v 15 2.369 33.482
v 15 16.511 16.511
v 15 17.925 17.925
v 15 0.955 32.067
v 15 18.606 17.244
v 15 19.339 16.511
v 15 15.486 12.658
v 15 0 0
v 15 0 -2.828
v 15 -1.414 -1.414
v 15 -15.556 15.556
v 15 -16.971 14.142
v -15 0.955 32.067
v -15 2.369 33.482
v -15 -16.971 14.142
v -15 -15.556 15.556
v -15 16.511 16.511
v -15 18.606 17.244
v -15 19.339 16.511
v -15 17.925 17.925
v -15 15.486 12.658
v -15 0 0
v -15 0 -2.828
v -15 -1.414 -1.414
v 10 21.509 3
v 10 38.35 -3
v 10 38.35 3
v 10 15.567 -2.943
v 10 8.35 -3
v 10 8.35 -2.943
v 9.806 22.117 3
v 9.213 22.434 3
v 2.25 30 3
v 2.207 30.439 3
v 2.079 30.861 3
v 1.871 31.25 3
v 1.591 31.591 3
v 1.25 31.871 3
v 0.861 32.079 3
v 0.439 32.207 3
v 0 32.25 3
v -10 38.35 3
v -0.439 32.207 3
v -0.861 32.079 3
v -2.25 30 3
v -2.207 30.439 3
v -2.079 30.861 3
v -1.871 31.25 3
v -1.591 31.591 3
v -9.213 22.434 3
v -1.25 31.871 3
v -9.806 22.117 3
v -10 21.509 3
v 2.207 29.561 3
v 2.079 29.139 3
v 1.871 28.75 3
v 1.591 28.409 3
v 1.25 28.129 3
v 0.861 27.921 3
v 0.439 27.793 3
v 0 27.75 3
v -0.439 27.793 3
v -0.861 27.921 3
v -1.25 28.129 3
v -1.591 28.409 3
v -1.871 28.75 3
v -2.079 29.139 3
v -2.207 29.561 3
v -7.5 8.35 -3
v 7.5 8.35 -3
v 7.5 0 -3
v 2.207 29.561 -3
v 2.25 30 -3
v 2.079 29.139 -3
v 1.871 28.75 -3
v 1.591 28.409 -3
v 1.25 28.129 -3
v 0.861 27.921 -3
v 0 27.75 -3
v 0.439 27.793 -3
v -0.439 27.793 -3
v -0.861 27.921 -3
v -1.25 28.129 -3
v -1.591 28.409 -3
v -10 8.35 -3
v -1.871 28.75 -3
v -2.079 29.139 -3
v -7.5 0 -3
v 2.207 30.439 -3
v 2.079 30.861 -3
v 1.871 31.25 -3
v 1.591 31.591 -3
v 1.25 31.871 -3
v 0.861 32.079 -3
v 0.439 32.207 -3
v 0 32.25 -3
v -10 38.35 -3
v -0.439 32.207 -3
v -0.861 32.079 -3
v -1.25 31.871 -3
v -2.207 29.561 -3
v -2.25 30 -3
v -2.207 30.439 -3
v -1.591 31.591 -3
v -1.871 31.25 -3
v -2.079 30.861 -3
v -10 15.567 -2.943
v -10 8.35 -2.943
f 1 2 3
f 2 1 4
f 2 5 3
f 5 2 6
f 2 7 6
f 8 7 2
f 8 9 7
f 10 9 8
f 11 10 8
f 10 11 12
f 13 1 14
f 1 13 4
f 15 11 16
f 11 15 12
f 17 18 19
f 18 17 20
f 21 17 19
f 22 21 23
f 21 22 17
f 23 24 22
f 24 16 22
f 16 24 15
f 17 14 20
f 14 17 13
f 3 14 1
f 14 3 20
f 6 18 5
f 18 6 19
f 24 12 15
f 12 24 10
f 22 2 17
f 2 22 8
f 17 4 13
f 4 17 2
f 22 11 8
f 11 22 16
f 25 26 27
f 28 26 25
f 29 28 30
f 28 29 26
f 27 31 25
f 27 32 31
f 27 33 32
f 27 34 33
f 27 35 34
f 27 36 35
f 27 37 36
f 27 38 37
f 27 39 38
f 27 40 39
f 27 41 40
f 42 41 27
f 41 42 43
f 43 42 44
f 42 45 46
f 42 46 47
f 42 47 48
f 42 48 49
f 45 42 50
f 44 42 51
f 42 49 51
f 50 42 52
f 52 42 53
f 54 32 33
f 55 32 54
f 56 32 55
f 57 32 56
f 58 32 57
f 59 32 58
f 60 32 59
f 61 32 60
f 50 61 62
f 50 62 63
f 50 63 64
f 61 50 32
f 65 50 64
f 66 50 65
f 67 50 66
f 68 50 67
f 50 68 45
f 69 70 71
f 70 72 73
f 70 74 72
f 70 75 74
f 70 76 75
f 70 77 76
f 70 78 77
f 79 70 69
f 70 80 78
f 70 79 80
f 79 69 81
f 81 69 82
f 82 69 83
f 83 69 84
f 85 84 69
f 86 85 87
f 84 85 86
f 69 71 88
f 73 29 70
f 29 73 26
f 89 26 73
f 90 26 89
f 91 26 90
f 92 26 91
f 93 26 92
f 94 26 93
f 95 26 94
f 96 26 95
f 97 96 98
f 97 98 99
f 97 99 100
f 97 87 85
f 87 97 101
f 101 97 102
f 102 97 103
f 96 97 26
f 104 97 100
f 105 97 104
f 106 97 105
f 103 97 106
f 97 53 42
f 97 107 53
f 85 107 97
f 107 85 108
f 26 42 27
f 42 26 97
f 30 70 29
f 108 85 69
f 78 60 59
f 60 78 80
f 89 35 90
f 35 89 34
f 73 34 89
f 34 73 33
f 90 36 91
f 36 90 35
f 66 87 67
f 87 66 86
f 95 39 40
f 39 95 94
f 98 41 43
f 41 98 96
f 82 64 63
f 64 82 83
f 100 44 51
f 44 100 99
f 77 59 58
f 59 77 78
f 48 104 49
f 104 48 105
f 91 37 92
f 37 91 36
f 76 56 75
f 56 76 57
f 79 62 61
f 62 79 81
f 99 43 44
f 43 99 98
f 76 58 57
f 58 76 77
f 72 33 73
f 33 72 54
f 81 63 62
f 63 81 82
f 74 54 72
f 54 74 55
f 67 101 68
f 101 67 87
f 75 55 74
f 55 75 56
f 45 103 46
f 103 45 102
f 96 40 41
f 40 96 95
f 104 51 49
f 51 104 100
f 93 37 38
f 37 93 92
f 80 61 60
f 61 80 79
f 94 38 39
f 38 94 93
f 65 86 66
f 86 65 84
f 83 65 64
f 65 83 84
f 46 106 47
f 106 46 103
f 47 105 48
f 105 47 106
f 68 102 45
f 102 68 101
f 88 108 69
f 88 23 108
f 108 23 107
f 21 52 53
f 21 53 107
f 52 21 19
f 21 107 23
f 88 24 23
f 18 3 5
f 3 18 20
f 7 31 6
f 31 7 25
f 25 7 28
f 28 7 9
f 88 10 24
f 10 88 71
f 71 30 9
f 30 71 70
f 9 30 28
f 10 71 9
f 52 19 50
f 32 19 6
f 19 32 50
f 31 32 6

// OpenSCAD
// file: syms.scad
module symY(t) {
    translate(t)
        children();
    mirror([0,1,0])
        translate(t)
            children();
}
module symX(t) {
    translate(t)
        children();
    mirror([1,0,0])
        translate(t)
            children();
}

module symZ(t) {
    translate(t)
        children();
    mirror([0,0,1])
        translate(t)
            children();
}

module	symXY(t) {
	tx=t[0];
	ty=t[1];
	tz=t[2];
	symX([tx,0,0])
	symY([0,ty,tz])
		children();
}

module magnetCut(D,S) {
    cylinder(d=D,h=10);
    for(d=[45,-45])
    rotate(d)
    cube([2*D,S,30],center=true);
}


// calculates the radius from "segment" paramers:
// https://en.wikipedia.org/wiki/Circular_segment
function    circleSlice2radius2(c,h) = (c*c/8/h)+ h/2;

function toInt(str) = 
    let(d = [for (s = str) ord(s) - 48], l = len(d) - 1)
    [for (i = 0, a = d[i];i <= l;i = i + 1, a = 10 * a + d[i]) a][l];
        
// main file
use<syms.scad>
Q=6.8+16.55;
L=30;
W=2;
H=20;

echo(Q);

A=45;
HOLE_D=4.5;
HOLE_DIST=20;   // hole-dist


rotate(A,[1,0,0])
translate([0,Q/2,H/2])
difference() {
    cube([L,Q+2*W,H+2*W],center=true);
    translate([0,0,W])
    cube([2*L,Q,H+2*W],center=true);
}


hull() {
    rotate(A,[1,0,0])
    translate([0,Q/2,-W/2])
    difference() {
        cube([L,Q+2*W,W],center=true);
    }
    translate([0,Q/2,-W])
    cube([L/2,Q,W],center=true);
}

    difference() {
        $fn=32;
        if(false) {
        hull()
        symX([L/2+HOLE_DIST,Q/2,-W])
        cylinder(d=HOLE_DIST,h=W,center=true);
        }else {
        translate([0,Q,0])
        cube([HOLE_DIST,L,3*W],center=true);
        }
        
        translate([0,L,-W])
        cylinder(d=HOLE_D,h=13*W,center=true);
    }
    


//cube(Q);
